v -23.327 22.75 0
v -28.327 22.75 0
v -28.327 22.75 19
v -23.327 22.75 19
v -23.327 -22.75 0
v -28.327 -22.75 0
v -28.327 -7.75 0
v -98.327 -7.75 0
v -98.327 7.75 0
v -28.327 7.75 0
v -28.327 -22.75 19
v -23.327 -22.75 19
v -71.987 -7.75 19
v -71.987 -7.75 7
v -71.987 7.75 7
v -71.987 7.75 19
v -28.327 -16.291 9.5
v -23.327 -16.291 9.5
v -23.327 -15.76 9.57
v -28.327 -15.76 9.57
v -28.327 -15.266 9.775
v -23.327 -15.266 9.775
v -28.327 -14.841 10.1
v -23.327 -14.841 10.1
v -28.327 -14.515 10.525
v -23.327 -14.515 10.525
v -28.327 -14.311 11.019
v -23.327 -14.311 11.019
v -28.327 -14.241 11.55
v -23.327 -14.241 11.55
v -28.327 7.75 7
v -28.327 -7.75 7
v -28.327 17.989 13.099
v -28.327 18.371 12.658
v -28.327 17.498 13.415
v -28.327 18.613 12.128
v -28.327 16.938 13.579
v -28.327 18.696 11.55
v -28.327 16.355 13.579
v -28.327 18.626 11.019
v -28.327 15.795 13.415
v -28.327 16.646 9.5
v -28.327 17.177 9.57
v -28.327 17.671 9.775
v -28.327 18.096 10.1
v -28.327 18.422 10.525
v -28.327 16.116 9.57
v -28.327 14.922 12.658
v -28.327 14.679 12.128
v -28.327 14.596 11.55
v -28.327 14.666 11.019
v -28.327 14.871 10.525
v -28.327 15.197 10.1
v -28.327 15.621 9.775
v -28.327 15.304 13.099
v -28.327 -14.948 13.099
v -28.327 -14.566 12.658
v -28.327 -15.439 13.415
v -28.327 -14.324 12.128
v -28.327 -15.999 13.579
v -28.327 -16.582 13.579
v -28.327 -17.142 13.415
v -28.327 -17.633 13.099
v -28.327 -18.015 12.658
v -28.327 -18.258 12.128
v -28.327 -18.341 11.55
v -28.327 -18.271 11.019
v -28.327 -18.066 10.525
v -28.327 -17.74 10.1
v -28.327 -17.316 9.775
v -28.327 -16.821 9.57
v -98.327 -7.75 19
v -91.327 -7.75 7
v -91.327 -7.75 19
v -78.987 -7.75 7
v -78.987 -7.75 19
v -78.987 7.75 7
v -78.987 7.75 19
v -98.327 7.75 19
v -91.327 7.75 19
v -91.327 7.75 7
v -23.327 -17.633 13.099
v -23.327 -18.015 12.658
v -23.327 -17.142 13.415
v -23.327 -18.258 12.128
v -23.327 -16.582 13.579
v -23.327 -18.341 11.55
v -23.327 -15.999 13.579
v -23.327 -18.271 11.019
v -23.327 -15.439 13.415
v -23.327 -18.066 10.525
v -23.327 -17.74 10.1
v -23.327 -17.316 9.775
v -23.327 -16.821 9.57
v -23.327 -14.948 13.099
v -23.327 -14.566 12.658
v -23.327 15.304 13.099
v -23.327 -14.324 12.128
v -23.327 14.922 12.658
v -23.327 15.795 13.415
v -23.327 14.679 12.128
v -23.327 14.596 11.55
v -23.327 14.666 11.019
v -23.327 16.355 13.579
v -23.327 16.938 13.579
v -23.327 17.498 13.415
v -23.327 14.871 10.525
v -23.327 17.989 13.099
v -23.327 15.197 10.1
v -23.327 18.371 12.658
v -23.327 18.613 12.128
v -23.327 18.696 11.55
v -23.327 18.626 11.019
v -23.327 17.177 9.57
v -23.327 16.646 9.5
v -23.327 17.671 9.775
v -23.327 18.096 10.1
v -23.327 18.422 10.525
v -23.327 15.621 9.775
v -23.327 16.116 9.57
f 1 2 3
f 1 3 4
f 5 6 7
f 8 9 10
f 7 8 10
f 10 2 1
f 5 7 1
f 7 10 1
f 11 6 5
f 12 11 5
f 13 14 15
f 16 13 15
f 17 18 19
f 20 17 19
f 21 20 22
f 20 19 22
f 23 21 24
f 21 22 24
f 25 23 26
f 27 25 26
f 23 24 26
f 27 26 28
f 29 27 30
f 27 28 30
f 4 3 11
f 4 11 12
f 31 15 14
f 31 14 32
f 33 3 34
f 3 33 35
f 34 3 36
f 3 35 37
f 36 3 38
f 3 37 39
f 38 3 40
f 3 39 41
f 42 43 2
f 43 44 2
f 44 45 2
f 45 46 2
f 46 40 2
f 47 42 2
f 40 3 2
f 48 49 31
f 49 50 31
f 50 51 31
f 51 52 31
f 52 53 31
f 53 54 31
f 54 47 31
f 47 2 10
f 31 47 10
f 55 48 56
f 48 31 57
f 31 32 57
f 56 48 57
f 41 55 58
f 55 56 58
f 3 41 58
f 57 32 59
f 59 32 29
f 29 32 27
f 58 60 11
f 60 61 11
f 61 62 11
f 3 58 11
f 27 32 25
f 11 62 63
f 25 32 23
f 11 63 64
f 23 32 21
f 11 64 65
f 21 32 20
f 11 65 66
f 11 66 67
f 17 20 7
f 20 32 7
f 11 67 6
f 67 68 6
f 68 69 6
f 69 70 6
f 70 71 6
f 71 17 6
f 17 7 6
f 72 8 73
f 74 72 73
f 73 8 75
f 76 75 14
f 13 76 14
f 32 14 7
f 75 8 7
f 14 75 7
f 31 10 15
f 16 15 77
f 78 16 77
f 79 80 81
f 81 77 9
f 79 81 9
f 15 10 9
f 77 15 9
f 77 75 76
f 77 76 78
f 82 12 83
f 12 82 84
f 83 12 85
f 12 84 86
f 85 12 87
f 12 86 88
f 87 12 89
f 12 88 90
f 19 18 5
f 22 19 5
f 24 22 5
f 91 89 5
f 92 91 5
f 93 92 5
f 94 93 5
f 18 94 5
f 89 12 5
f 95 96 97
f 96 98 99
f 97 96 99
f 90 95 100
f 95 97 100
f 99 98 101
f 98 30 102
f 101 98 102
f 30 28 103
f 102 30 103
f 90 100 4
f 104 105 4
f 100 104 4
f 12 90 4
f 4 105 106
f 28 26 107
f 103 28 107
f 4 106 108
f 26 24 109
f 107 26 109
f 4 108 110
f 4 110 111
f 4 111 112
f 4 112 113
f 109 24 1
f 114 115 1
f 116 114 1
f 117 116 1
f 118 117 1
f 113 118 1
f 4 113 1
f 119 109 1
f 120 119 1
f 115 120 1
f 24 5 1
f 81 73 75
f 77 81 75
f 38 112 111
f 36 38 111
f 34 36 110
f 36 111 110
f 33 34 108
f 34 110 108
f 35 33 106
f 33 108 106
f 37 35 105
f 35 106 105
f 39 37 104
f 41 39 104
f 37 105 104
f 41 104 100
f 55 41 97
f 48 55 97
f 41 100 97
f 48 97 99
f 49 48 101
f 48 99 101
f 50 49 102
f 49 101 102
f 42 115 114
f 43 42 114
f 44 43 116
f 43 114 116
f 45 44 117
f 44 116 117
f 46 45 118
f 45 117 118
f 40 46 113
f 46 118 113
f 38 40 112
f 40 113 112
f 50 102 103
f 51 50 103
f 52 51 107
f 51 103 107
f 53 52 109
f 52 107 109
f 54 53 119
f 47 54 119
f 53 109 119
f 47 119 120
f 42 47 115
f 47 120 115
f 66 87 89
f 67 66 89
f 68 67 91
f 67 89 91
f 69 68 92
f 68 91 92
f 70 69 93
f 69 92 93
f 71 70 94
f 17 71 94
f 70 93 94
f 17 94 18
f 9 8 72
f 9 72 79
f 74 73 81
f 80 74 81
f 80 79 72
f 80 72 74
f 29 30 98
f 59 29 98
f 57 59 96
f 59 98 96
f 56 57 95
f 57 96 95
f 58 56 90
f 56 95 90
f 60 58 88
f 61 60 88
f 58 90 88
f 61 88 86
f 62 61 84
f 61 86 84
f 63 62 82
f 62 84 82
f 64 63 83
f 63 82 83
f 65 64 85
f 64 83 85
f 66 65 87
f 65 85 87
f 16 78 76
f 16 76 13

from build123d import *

# Parameters (mm, degrees)
F0_W     = 7
F0_H     = 15.5
F0_W_2   = 12.34
F0_W_3   = 43.66
F0_W_4   = 5
F1_DEPTH = 7
F0_H_2   = 15
F2_DEPTH = 19
F4_DEPTH = 15


with BuildPart() as f1:
    # F0 (on Top) → F1 (new body)
    with BuildSketch(Plane.XY):
        with Locations((-94.8272068564, 0)):
            Rectangle(F0_W, F0_H)
        with Locations((-85.1572068564, 0)):
            Rectangle(F0_W_2, F0_H)
        with Locations((-75.4872068564, 0)):
            Rectangle(F0_W, F0_H)
        with Locations((-50.1572068564, 0)):
            Rectangle(F0_W_3, F0_H)
        with Locations((-25.8272068564, 0)):
            Rectangle(F0_W_4, F0_H)
    extrude(amount=F1_DEPTH)

    # F0 (on Top) → F2 (join)
    with BuildSketch(Plane.XY):
        with Locations((-94.8272068564, 0)):
            Rectangle(F0_W, F0_H)
        with Locations((-75.4872068564, 0)):
            Rectangle(F0_W, F0_H)
        with Locations((-25.8272068564, 0)):
            Rectangle(F0_W_4, F0_H)
        with Locations((-25.8272068564, 15.25)):
            Rectangle(F0_W_4, F0_H_2)
        with Locations((-25.8272068564, -15.25)):
            Rectangle(F0_W_4, F0_H_2)
    extrude(amount=F2_DEPTH)

    # F3 (on face) → F4 (cut)
    with BuildSketch(Plane.YZ.offset(-23.3272068564)):
        with BuildLine():
            ThreePointArc((-14.2406609476, 11.55), (-16.2906609476, 13.6), (-18.3406609476, 11.55))
            Line((-18.3406609476, 11.55), (-14.2406609476, 11.55))
        make_face()
        with BuildLine():
            ThreePointArc((-18.3406609476, 11.55), (-17.740229849, 10.1004310986), (-16.2906609476, 9.5))
            ThreePointArc((-16.2906609476, 9.5), (-14.8410920461, 10.1004310986), (-14.2406609476, 11.55))
            Line((-14.2406609476, 11.55), (-18.3406609476, 11.55))
        make_face()
        with BuildLine():
            ThreePointArc((18.6963237256, 11.55), (16.6463237256, 13.6), (14.5963237256, 11.55))
            Line((14.5963237256, 11.55), (18.6963237256, 11.55))
        make_face()
        with BuildLine():
            ThreePointArc((14.5963237256, 11.55), (15.1967548241, 10.1004310986), (16.6463237256, 9.5))
            ThreePointArc((16.6463237256, 9.5), (18.095892627, 10.1004310986), (18.6963237256, 11.55))
            Line((18.6963237256, 11.55), (14.5963237256, 11.55))
        make_face()
    extrude(amount=-F4_DEPTH, mode=Mode.SUBTRACT)


solid = f1.part
